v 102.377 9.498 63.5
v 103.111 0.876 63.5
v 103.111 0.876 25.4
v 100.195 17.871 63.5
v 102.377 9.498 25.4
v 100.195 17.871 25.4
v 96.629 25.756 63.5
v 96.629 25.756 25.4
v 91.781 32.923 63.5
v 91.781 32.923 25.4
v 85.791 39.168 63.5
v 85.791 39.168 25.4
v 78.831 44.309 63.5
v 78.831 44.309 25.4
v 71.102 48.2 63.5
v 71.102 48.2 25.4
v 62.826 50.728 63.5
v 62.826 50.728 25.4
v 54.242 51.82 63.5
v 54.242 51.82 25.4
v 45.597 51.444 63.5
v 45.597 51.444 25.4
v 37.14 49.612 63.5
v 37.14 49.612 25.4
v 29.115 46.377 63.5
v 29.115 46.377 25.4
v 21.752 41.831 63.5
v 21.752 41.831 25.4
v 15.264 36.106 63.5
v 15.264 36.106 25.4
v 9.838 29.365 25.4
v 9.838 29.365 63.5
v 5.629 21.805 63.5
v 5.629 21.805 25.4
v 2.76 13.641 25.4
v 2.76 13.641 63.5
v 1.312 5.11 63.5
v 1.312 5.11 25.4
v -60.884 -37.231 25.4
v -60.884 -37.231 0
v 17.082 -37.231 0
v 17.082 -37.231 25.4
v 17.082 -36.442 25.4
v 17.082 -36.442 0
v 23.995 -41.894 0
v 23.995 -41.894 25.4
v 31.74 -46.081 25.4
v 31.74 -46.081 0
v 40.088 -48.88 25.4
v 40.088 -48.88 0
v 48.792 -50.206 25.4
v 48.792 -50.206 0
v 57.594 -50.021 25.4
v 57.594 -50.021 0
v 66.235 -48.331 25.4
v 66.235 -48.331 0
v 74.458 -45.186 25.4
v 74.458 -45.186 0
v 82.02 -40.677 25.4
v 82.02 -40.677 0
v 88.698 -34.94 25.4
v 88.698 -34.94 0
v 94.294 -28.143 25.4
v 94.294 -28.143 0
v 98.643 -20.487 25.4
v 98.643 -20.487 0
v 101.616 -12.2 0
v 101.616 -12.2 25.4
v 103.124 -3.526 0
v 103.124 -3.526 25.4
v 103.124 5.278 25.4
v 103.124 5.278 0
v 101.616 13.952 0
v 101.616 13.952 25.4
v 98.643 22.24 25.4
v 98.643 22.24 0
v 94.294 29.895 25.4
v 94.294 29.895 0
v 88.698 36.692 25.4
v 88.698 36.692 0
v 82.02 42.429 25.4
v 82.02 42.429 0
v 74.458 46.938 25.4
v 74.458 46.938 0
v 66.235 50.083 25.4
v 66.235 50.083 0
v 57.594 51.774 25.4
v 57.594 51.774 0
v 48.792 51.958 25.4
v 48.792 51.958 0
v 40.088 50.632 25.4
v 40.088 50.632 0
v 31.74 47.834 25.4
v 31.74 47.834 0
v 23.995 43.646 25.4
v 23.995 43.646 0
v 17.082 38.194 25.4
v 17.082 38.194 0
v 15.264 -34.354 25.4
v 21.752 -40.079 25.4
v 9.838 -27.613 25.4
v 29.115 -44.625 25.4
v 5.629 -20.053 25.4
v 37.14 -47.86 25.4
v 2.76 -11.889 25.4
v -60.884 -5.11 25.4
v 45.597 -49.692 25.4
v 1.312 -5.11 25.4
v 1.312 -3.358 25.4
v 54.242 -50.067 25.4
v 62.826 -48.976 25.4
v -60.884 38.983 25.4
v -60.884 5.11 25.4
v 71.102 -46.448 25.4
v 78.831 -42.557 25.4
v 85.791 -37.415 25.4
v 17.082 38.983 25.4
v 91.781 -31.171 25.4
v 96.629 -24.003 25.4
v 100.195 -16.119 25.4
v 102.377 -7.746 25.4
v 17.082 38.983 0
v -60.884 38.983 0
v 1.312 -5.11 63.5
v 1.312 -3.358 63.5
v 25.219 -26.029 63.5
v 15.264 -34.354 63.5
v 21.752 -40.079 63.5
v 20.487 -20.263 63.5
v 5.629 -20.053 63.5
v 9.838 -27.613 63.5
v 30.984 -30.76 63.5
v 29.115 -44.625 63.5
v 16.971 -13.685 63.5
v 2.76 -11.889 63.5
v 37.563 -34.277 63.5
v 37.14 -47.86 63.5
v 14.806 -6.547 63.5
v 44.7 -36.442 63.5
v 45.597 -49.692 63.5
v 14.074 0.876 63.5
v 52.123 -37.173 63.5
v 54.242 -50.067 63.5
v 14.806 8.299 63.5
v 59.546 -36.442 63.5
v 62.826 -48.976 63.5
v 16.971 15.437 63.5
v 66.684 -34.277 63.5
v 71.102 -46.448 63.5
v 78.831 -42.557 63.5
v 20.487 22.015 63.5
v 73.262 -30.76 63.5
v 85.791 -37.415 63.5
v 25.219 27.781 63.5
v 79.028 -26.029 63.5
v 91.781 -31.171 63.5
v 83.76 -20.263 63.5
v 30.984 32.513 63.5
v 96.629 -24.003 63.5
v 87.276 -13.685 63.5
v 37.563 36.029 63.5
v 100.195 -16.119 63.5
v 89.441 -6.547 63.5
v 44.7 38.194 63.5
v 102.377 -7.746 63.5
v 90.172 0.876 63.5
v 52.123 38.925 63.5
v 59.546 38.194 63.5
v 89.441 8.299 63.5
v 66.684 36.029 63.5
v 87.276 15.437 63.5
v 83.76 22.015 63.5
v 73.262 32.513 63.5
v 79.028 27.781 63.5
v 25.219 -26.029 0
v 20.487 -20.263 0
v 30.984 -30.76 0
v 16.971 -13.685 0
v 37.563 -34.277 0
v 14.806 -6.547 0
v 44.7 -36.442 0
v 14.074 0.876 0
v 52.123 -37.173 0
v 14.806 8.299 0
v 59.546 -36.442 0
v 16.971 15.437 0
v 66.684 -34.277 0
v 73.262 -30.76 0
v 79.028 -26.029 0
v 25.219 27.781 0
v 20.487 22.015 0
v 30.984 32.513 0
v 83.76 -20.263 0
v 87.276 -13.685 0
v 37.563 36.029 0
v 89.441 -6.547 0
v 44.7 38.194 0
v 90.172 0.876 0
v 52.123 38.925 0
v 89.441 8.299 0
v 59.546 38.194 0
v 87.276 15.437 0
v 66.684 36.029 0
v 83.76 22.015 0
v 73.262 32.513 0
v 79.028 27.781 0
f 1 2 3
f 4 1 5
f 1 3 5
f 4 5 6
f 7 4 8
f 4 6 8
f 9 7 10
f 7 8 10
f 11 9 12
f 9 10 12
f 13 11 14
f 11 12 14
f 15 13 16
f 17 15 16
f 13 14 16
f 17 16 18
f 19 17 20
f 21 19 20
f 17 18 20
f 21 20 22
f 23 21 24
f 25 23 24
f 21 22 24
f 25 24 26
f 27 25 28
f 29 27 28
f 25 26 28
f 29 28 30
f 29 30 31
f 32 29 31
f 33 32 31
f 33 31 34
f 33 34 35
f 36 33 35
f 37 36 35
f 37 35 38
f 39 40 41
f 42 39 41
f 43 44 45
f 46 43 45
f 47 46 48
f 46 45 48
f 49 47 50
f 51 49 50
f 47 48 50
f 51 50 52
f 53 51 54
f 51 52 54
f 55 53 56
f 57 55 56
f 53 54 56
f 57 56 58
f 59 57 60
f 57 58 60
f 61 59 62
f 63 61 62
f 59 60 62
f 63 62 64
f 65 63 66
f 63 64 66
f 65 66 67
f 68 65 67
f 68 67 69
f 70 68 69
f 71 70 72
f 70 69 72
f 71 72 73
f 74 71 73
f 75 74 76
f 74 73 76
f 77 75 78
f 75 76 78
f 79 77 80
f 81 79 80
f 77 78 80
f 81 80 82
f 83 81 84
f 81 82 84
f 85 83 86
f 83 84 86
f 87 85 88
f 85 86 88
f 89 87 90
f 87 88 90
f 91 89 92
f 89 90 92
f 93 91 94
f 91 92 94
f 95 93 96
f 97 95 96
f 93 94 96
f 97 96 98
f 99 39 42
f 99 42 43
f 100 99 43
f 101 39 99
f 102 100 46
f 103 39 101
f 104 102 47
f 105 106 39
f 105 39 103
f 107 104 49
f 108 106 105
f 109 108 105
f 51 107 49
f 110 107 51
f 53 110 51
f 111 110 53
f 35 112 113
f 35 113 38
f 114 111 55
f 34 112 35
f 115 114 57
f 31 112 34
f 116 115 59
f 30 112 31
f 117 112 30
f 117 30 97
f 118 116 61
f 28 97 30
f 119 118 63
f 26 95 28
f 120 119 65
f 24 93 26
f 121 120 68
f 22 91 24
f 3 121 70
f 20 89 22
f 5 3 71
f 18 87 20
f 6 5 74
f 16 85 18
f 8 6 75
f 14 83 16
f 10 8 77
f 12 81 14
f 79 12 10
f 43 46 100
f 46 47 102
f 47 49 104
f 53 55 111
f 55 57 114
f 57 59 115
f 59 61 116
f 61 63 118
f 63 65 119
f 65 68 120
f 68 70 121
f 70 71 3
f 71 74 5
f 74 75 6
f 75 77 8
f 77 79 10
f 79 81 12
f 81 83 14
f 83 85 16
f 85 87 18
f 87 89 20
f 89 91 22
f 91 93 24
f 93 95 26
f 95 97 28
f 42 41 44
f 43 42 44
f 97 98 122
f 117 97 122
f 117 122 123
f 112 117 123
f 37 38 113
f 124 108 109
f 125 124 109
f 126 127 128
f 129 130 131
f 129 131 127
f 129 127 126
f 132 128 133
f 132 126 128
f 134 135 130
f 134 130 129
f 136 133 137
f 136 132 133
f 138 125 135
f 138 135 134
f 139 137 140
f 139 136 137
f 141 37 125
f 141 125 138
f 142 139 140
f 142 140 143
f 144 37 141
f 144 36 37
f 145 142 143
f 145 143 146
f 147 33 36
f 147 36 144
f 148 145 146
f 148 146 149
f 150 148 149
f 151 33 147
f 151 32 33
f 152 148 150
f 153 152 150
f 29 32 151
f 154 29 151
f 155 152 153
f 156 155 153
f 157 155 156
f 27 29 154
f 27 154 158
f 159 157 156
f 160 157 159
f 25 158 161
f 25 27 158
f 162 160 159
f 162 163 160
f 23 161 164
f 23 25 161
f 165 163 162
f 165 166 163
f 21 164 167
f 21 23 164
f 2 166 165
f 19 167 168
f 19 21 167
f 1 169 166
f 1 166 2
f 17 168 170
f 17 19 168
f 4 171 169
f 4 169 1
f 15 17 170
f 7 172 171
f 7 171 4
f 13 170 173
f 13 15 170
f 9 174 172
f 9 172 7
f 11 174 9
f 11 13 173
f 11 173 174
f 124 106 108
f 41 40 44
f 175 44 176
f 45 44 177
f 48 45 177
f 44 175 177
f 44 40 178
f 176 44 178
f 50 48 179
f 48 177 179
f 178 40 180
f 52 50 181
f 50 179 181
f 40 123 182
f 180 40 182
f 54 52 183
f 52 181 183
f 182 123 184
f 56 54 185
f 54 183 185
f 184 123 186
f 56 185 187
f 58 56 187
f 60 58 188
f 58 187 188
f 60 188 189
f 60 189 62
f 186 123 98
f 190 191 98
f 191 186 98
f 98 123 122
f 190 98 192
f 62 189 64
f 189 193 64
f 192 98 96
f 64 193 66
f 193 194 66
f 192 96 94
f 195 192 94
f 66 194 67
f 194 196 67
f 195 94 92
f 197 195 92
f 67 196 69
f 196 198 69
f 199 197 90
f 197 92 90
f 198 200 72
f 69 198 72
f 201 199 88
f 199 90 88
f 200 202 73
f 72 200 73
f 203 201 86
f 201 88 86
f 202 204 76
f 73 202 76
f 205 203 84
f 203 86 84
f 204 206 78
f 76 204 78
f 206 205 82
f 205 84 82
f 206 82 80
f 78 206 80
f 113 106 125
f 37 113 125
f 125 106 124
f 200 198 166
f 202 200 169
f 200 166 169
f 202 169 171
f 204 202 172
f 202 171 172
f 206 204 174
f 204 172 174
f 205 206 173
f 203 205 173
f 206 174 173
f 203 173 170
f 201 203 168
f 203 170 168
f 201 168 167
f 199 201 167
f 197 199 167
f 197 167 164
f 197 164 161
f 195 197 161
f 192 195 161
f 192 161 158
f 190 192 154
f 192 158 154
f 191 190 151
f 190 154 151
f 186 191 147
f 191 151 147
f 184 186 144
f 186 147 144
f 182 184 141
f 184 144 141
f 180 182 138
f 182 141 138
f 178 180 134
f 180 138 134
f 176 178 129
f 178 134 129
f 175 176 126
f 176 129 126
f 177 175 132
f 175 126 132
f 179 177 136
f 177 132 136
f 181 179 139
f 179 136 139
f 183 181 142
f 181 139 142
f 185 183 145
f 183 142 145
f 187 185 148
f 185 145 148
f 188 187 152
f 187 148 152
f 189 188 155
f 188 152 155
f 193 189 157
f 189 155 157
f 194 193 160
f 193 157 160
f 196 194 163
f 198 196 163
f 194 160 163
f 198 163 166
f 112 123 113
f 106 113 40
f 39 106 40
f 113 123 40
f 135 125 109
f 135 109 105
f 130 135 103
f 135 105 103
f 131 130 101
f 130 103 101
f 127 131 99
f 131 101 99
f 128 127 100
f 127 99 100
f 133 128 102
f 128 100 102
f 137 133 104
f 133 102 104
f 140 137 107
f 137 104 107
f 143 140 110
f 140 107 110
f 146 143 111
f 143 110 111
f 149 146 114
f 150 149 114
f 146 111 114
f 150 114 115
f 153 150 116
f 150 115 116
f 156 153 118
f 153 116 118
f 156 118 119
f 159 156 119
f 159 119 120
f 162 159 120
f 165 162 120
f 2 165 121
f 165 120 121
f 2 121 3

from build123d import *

# Parameters (mm, degrees)
F1_DEPTH = 25.4
F2_R     = 50.9875391609
F3_DEPTH = 38.1
F5_DEPTH = 38.1
F7_DEPTH = 25.4
F8_R     = 38.0488836494
F9_DEPTH = 63.5


with BuildPart() as f1:
    # F0 (on Top) → F1 (new body)
    with BuildSketch(Plane.XY):
        with BuildLine():
            Line((-60.883525759, 38.982976228), (-60.883525759, -37.2309312224))
            Line((-60.883525759, -37.2309312224), (17.0824285597, -37.2309312224))
            Line((17.0824285597, -37.2309312224), (17.0824285597, -36.4418395362))
            ThreePointArc((17.0824285597, -36.4418395362), (0.9326223834, 0.8760225028), (17.0824285597, 38.1938845418))
            Line((17.0824285597, 38.1938845418), (17.0824285597, 38.982976228))
            Line((17.0824285597, 38.982976228), (-60.883525759, 38.982976228))
        make_face()
        with BuildLine():
            Line((17.0824285597, 38.1938845418), (17.0824285597, -36.4418395362))
            ThreePointArc((17.0824285597, -36.4418395362), (72.4545517176, -46.1040347879), (103.313979079, 0.8760225028))
            ThreePointArc((103.313979079, 0.8760225028), (72.4545517176, 47.8560797934), (17.0824285597, 38.1938845418))
        make_face()
        with BuildLine():
            ThreePointArc((17.0824285597, 38.1938845418), (0.9326223834, 0.8760225028), (17.0824285597, -36.4418395362))
            Line((17.0824285597, -36.4418395362), (17.0824285597, 38.1938845418))
        make_face()
    extrude(amount=F1_DEPTH)

    # F2 (on face) → F3 (join)
    with BuildSketch(Plane.XY.offset(25.4)):
        with Locations((52.1233007312, 0.8760225028)):
            Circle(F2_R)
    extrude(amount=F3_DEPTH)

    # F4 (on face) → F5 (join)
    with BuildSketch(Plane.XY.offset(25.4)):
        with BuildLine():
            Line((1.311869915, 5.1101278514), (-60.883525759, 5.1101278514))
            Line((-60.883525759, 5.1101278514), (-60.883525759, -5.1101278514))
            Line((-60.883525759, -5.1101278514), (0, -5.1101278514))
            Line((0, -5.1101278514), (1.311869915, -5.1101278514))
            Line((1.311869915, -5.1101278514), (1.311869915, -3.3580828458))
            ThreePointArc((1.311869915, -3.3580828458), (1.1357615703, 0.8760225028), (1.311869915, 5.1101278514))
        make_face()
    extrude(amount=F5_DEPTH)

    # F6 (on face) → F7 (cut)
    with BuildSketch(Plane.XZ.offset(5.1101278514)):
        Polygon((-60.883525759, 63.5), (-60.883525759, 25.4), (1.311869915, 63.5), align=None)
    extrude(amount=-F7_DEPTH, mode=Mode.SUBTRACT)

    # F8 (on face) → F9 (cut)
    with BuildSketch(Plane.XY.offset(63.5)):
        with Locations((52.1233007312, 0.8760225028)):
            Circle(F8_R)
    extrude(amount=-F9_DEPTH, mode=Mode.SUBTRACT)


solid = f1.part
